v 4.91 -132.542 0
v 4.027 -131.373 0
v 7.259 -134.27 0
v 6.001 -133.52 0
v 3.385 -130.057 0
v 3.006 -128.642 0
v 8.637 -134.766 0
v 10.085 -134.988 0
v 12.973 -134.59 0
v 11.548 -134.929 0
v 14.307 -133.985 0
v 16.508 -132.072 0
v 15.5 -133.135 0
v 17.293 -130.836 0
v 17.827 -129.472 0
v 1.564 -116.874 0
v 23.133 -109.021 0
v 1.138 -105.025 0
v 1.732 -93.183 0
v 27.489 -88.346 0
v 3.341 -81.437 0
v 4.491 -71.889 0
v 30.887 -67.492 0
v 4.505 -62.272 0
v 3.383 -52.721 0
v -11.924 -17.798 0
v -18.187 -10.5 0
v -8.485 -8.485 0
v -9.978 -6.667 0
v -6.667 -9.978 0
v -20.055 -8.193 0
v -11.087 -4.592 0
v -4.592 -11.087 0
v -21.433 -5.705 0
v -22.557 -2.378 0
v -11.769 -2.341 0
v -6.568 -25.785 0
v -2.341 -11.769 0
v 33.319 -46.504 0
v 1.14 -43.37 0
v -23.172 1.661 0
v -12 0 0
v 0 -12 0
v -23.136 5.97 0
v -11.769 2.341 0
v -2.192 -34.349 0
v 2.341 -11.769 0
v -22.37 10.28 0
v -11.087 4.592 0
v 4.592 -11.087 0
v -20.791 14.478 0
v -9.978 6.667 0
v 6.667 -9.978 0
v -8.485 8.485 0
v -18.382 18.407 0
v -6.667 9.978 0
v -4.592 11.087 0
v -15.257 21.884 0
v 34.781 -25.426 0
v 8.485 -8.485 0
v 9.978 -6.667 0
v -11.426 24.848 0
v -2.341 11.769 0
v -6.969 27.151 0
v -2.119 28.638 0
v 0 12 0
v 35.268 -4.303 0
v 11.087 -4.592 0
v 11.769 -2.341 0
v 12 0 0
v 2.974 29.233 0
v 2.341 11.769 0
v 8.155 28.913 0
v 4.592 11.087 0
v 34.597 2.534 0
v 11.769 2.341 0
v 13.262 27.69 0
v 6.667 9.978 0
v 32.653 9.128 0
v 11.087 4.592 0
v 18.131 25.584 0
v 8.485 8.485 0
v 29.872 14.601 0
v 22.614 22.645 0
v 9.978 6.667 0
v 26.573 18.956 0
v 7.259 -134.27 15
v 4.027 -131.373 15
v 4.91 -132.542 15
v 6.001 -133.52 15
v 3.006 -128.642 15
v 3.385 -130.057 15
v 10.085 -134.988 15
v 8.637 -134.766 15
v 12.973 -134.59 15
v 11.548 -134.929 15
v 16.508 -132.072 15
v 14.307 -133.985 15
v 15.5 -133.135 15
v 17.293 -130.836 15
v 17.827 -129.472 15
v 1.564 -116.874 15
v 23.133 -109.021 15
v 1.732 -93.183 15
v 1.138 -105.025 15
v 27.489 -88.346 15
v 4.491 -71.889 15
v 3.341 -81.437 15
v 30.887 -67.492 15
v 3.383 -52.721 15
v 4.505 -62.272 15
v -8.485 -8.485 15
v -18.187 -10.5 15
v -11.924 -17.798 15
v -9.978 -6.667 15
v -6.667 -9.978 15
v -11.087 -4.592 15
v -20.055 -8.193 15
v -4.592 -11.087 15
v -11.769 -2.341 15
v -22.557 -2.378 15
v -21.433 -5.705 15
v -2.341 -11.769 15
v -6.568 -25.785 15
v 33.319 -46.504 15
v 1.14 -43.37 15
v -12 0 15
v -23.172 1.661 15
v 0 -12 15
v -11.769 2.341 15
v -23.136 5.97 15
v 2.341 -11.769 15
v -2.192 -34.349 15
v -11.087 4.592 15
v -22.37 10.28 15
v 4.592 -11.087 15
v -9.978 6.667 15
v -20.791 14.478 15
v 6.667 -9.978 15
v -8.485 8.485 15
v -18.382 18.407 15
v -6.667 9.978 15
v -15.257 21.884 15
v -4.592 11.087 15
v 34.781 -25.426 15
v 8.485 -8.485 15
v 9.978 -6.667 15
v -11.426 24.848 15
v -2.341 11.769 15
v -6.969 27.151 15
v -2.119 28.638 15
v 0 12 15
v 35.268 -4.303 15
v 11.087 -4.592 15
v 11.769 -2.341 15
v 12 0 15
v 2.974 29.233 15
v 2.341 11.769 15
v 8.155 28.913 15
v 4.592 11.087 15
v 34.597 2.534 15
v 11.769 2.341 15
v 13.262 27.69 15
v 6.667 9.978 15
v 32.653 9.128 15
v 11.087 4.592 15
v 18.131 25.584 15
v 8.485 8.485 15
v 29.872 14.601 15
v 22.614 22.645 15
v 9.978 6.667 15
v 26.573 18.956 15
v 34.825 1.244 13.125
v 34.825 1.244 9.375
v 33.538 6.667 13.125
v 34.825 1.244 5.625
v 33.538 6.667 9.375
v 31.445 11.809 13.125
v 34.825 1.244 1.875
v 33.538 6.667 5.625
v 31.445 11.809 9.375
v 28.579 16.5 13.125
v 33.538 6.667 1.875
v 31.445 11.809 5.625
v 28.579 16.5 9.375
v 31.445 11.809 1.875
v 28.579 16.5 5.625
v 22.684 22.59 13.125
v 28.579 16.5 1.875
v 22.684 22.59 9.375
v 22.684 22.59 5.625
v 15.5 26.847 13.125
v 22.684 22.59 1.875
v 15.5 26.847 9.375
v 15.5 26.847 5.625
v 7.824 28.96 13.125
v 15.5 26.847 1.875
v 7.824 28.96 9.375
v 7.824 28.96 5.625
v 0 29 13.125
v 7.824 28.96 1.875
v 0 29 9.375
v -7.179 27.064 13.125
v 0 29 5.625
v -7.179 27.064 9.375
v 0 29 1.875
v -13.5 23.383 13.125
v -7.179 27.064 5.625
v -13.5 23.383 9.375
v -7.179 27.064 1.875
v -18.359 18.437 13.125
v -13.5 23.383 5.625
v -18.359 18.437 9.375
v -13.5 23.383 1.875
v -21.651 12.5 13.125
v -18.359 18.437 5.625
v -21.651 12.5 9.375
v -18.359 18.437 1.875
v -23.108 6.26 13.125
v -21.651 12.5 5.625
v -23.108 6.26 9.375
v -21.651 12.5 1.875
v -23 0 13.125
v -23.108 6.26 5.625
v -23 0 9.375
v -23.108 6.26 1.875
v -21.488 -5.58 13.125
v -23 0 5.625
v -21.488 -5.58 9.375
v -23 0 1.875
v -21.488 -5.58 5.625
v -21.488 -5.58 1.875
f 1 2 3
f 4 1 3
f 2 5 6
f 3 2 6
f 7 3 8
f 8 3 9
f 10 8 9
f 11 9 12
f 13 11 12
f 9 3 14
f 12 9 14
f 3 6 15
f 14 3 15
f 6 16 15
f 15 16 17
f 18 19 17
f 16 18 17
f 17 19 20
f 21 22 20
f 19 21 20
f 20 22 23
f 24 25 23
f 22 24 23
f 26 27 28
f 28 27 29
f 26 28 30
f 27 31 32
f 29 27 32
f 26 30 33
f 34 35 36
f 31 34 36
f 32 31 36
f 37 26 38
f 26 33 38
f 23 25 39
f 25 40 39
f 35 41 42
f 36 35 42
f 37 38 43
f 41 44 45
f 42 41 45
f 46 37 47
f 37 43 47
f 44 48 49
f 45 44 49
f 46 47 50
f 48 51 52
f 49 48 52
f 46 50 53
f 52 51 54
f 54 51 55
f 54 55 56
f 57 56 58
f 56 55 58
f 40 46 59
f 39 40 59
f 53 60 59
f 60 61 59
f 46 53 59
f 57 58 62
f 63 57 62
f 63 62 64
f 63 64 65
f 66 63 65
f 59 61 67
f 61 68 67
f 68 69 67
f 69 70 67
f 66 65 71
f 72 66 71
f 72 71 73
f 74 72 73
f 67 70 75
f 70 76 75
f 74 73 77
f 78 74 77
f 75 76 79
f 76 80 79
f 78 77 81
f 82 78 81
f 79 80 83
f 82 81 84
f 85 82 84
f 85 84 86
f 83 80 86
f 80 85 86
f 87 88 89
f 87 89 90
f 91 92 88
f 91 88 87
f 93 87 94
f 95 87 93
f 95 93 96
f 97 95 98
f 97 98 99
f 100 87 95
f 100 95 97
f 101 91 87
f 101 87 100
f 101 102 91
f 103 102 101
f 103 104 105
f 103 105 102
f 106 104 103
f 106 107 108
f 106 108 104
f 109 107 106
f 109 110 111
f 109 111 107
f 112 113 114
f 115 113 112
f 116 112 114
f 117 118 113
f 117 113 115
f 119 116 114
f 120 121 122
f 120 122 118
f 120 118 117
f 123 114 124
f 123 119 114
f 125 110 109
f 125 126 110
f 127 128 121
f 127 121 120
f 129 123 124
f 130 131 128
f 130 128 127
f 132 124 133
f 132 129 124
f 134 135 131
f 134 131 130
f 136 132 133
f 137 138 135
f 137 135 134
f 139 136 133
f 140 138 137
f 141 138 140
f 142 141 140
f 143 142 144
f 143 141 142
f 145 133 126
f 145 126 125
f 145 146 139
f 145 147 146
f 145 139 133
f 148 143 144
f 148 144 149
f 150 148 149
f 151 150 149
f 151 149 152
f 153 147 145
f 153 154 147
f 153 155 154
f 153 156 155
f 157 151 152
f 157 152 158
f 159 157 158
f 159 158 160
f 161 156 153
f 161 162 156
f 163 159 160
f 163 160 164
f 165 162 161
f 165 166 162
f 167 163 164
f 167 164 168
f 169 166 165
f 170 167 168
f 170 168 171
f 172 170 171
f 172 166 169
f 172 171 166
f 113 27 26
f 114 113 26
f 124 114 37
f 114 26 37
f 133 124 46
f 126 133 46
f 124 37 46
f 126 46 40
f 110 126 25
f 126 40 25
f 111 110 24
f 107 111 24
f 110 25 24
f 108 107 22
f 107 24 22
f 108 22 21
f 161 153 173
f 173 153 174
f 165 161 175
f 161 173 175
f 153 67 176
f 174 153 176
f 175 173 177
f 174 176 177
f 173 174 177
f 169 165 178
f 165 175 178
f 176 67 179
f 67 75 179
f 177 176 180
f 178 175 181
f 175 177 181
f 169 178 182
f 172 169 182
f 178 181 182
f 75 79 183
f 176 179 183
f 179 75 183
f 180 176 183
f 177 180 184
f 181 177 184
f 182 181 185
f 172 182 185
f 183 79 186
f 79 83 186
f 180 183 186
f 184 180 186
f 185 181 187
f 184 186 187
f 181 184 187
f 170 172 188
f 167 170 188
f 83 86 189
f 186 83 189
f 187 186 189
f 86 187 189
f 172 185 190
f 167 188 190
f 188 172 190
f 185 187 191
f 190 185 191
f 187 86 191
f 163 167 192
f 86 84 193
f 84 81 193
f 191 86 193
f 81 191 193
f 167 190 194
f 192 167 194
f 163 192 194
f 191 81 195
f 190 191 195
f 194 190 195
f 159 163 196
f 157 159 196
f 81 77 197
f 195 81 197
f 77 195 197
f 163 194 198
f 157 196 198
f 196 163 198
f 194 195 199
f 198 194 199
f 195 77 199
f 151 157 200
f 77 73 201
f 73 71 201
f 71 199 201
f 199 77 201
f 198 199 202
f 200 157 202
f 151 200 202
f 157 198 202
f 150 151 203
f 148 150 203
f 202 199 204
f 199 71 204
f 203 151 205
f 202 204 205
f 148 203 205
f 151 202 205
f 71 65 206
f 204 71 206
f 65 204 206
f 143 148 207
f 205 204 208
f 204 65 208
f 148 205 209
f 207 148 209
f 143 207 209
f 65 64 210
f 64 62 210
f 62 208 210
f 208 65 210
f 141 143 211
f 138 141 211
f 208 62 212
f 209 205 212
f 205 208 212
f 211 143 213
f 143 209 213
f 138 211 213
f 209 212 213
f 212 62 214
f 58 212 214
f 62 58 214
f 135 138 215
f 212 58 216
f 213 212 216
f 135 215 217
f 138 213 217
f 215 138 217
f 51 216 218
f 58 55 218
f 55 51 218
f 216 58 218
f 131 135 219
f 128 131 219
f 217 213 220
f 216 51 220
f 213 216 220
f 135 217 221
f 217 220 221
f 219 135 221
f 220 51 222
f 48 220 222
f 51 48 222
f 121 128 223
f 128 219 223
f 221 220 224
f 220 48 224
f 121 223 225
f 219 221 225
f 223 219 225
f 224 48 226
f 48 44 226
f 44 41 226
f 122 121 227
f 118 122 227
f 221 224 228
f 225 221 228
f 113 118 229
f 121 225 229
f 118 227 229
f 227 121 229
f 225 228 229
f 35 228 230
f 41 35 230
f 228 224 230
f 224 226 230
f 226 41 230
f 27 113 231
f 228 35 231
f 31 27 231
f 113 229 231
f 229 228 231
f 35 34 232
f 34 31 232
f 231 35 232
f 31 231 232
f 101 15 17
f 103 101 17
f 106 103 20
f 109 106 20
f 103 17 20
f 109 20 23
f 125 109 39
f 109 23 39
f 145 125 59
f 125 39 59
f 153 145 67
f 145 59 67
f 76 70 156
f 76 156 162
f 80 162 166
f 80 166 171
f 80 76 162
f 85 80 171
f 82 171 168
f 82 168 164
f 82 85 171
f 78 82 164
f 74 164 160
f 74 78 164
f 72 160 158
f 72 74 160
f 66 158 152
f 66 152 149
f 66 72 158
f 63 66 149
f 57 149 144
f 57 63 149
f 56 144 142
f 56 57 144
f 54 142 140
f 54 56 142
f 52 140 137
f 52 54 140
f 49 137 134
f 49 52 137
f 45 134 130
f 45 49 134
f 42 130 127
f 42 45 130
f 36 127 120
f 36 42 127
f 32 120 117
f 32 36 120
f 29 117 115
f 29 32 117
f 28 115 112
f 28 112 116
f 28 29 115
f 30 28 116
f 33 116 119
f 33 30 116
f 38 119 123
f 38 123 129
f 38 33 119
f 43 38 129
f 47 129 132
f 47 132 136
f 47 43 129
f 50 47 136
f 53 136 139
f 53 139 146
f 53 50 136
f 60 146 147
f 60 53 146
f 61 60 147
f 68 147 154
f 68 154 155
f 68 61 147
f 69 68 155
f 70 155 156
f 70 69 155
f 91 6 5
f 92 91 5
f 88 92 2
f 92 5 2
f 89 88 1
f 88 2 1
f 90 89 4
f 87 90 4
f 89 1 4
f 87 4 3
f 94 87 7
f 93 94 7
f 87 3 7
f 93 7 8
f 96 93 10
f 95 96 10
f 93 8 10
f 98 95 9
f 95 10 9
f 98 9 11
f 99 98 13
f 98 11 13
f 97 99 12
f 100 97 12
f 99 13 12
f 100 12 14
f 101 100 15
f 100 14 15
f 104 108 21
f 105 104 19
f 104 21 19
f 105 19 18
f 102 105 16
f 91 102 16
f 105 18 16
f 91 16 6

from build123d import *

# Parameters (mm, degrees)
F1_R     = 12
F2_DEPTH = 15


with BuildPart() as f2:
    # F1 (on face) → F2 (new body)
    with BuildSketch(Plane.XY):
        with BuildLine():
            ThreePointArc((17.8272945993, -129.4724747228), (30.8870152167, -67.4921341785), (35.2682027622, -4.3025455402))
            add(Edge.make_bspline(
                [(35.2682027622, -4.3025455402), (35.2682027622, -2.8630395725), (34.7940906326, 4.5484558025), (29.9290871814, 17.4019463757), (16.1515405759, 28.168861008), (-0.0978770248, 30.3942939385), (-14.2158344876, 24.4556370199), (-22.8083044544, 13.0367090709), (-23.9004306853, -0.1517972714), (-21.1020014845, -7.483800271), (-18.1865334795, -10.5)],
                knots=[0.1989185015, 0.1989185015, 0.1989185015, 0.1989185015, 0.2248112778, 0.3326230217, 0.4372558817, 0.5386130078, 0.6365884477, 0.7310656976, 0.8219159332, 0.9089958388, 0.9089958388, 0.9089958388, 0.9089958388], degree=3))
            ThreePointArc((-18.1865334795, -10.5), (1.139918362, -43.3697806371), (3.3405694731, -81.4367131981))
            ThreePointArc((3.3405694731, -81.4367131981), (1.1378022248, -105.0250778662), (3.0062398837, -128.6422765143))
            ThreePointArc((3.0062398837, -128.6422765143), (10.0845593286, -134.9880938543), (17.8272945993, -129.4724747228))
        make_face()
        Circle(F1_R, mode=Mode.SUBTRACT)
    extrude(amount=F2_DEPTH)


solid = f2.part
